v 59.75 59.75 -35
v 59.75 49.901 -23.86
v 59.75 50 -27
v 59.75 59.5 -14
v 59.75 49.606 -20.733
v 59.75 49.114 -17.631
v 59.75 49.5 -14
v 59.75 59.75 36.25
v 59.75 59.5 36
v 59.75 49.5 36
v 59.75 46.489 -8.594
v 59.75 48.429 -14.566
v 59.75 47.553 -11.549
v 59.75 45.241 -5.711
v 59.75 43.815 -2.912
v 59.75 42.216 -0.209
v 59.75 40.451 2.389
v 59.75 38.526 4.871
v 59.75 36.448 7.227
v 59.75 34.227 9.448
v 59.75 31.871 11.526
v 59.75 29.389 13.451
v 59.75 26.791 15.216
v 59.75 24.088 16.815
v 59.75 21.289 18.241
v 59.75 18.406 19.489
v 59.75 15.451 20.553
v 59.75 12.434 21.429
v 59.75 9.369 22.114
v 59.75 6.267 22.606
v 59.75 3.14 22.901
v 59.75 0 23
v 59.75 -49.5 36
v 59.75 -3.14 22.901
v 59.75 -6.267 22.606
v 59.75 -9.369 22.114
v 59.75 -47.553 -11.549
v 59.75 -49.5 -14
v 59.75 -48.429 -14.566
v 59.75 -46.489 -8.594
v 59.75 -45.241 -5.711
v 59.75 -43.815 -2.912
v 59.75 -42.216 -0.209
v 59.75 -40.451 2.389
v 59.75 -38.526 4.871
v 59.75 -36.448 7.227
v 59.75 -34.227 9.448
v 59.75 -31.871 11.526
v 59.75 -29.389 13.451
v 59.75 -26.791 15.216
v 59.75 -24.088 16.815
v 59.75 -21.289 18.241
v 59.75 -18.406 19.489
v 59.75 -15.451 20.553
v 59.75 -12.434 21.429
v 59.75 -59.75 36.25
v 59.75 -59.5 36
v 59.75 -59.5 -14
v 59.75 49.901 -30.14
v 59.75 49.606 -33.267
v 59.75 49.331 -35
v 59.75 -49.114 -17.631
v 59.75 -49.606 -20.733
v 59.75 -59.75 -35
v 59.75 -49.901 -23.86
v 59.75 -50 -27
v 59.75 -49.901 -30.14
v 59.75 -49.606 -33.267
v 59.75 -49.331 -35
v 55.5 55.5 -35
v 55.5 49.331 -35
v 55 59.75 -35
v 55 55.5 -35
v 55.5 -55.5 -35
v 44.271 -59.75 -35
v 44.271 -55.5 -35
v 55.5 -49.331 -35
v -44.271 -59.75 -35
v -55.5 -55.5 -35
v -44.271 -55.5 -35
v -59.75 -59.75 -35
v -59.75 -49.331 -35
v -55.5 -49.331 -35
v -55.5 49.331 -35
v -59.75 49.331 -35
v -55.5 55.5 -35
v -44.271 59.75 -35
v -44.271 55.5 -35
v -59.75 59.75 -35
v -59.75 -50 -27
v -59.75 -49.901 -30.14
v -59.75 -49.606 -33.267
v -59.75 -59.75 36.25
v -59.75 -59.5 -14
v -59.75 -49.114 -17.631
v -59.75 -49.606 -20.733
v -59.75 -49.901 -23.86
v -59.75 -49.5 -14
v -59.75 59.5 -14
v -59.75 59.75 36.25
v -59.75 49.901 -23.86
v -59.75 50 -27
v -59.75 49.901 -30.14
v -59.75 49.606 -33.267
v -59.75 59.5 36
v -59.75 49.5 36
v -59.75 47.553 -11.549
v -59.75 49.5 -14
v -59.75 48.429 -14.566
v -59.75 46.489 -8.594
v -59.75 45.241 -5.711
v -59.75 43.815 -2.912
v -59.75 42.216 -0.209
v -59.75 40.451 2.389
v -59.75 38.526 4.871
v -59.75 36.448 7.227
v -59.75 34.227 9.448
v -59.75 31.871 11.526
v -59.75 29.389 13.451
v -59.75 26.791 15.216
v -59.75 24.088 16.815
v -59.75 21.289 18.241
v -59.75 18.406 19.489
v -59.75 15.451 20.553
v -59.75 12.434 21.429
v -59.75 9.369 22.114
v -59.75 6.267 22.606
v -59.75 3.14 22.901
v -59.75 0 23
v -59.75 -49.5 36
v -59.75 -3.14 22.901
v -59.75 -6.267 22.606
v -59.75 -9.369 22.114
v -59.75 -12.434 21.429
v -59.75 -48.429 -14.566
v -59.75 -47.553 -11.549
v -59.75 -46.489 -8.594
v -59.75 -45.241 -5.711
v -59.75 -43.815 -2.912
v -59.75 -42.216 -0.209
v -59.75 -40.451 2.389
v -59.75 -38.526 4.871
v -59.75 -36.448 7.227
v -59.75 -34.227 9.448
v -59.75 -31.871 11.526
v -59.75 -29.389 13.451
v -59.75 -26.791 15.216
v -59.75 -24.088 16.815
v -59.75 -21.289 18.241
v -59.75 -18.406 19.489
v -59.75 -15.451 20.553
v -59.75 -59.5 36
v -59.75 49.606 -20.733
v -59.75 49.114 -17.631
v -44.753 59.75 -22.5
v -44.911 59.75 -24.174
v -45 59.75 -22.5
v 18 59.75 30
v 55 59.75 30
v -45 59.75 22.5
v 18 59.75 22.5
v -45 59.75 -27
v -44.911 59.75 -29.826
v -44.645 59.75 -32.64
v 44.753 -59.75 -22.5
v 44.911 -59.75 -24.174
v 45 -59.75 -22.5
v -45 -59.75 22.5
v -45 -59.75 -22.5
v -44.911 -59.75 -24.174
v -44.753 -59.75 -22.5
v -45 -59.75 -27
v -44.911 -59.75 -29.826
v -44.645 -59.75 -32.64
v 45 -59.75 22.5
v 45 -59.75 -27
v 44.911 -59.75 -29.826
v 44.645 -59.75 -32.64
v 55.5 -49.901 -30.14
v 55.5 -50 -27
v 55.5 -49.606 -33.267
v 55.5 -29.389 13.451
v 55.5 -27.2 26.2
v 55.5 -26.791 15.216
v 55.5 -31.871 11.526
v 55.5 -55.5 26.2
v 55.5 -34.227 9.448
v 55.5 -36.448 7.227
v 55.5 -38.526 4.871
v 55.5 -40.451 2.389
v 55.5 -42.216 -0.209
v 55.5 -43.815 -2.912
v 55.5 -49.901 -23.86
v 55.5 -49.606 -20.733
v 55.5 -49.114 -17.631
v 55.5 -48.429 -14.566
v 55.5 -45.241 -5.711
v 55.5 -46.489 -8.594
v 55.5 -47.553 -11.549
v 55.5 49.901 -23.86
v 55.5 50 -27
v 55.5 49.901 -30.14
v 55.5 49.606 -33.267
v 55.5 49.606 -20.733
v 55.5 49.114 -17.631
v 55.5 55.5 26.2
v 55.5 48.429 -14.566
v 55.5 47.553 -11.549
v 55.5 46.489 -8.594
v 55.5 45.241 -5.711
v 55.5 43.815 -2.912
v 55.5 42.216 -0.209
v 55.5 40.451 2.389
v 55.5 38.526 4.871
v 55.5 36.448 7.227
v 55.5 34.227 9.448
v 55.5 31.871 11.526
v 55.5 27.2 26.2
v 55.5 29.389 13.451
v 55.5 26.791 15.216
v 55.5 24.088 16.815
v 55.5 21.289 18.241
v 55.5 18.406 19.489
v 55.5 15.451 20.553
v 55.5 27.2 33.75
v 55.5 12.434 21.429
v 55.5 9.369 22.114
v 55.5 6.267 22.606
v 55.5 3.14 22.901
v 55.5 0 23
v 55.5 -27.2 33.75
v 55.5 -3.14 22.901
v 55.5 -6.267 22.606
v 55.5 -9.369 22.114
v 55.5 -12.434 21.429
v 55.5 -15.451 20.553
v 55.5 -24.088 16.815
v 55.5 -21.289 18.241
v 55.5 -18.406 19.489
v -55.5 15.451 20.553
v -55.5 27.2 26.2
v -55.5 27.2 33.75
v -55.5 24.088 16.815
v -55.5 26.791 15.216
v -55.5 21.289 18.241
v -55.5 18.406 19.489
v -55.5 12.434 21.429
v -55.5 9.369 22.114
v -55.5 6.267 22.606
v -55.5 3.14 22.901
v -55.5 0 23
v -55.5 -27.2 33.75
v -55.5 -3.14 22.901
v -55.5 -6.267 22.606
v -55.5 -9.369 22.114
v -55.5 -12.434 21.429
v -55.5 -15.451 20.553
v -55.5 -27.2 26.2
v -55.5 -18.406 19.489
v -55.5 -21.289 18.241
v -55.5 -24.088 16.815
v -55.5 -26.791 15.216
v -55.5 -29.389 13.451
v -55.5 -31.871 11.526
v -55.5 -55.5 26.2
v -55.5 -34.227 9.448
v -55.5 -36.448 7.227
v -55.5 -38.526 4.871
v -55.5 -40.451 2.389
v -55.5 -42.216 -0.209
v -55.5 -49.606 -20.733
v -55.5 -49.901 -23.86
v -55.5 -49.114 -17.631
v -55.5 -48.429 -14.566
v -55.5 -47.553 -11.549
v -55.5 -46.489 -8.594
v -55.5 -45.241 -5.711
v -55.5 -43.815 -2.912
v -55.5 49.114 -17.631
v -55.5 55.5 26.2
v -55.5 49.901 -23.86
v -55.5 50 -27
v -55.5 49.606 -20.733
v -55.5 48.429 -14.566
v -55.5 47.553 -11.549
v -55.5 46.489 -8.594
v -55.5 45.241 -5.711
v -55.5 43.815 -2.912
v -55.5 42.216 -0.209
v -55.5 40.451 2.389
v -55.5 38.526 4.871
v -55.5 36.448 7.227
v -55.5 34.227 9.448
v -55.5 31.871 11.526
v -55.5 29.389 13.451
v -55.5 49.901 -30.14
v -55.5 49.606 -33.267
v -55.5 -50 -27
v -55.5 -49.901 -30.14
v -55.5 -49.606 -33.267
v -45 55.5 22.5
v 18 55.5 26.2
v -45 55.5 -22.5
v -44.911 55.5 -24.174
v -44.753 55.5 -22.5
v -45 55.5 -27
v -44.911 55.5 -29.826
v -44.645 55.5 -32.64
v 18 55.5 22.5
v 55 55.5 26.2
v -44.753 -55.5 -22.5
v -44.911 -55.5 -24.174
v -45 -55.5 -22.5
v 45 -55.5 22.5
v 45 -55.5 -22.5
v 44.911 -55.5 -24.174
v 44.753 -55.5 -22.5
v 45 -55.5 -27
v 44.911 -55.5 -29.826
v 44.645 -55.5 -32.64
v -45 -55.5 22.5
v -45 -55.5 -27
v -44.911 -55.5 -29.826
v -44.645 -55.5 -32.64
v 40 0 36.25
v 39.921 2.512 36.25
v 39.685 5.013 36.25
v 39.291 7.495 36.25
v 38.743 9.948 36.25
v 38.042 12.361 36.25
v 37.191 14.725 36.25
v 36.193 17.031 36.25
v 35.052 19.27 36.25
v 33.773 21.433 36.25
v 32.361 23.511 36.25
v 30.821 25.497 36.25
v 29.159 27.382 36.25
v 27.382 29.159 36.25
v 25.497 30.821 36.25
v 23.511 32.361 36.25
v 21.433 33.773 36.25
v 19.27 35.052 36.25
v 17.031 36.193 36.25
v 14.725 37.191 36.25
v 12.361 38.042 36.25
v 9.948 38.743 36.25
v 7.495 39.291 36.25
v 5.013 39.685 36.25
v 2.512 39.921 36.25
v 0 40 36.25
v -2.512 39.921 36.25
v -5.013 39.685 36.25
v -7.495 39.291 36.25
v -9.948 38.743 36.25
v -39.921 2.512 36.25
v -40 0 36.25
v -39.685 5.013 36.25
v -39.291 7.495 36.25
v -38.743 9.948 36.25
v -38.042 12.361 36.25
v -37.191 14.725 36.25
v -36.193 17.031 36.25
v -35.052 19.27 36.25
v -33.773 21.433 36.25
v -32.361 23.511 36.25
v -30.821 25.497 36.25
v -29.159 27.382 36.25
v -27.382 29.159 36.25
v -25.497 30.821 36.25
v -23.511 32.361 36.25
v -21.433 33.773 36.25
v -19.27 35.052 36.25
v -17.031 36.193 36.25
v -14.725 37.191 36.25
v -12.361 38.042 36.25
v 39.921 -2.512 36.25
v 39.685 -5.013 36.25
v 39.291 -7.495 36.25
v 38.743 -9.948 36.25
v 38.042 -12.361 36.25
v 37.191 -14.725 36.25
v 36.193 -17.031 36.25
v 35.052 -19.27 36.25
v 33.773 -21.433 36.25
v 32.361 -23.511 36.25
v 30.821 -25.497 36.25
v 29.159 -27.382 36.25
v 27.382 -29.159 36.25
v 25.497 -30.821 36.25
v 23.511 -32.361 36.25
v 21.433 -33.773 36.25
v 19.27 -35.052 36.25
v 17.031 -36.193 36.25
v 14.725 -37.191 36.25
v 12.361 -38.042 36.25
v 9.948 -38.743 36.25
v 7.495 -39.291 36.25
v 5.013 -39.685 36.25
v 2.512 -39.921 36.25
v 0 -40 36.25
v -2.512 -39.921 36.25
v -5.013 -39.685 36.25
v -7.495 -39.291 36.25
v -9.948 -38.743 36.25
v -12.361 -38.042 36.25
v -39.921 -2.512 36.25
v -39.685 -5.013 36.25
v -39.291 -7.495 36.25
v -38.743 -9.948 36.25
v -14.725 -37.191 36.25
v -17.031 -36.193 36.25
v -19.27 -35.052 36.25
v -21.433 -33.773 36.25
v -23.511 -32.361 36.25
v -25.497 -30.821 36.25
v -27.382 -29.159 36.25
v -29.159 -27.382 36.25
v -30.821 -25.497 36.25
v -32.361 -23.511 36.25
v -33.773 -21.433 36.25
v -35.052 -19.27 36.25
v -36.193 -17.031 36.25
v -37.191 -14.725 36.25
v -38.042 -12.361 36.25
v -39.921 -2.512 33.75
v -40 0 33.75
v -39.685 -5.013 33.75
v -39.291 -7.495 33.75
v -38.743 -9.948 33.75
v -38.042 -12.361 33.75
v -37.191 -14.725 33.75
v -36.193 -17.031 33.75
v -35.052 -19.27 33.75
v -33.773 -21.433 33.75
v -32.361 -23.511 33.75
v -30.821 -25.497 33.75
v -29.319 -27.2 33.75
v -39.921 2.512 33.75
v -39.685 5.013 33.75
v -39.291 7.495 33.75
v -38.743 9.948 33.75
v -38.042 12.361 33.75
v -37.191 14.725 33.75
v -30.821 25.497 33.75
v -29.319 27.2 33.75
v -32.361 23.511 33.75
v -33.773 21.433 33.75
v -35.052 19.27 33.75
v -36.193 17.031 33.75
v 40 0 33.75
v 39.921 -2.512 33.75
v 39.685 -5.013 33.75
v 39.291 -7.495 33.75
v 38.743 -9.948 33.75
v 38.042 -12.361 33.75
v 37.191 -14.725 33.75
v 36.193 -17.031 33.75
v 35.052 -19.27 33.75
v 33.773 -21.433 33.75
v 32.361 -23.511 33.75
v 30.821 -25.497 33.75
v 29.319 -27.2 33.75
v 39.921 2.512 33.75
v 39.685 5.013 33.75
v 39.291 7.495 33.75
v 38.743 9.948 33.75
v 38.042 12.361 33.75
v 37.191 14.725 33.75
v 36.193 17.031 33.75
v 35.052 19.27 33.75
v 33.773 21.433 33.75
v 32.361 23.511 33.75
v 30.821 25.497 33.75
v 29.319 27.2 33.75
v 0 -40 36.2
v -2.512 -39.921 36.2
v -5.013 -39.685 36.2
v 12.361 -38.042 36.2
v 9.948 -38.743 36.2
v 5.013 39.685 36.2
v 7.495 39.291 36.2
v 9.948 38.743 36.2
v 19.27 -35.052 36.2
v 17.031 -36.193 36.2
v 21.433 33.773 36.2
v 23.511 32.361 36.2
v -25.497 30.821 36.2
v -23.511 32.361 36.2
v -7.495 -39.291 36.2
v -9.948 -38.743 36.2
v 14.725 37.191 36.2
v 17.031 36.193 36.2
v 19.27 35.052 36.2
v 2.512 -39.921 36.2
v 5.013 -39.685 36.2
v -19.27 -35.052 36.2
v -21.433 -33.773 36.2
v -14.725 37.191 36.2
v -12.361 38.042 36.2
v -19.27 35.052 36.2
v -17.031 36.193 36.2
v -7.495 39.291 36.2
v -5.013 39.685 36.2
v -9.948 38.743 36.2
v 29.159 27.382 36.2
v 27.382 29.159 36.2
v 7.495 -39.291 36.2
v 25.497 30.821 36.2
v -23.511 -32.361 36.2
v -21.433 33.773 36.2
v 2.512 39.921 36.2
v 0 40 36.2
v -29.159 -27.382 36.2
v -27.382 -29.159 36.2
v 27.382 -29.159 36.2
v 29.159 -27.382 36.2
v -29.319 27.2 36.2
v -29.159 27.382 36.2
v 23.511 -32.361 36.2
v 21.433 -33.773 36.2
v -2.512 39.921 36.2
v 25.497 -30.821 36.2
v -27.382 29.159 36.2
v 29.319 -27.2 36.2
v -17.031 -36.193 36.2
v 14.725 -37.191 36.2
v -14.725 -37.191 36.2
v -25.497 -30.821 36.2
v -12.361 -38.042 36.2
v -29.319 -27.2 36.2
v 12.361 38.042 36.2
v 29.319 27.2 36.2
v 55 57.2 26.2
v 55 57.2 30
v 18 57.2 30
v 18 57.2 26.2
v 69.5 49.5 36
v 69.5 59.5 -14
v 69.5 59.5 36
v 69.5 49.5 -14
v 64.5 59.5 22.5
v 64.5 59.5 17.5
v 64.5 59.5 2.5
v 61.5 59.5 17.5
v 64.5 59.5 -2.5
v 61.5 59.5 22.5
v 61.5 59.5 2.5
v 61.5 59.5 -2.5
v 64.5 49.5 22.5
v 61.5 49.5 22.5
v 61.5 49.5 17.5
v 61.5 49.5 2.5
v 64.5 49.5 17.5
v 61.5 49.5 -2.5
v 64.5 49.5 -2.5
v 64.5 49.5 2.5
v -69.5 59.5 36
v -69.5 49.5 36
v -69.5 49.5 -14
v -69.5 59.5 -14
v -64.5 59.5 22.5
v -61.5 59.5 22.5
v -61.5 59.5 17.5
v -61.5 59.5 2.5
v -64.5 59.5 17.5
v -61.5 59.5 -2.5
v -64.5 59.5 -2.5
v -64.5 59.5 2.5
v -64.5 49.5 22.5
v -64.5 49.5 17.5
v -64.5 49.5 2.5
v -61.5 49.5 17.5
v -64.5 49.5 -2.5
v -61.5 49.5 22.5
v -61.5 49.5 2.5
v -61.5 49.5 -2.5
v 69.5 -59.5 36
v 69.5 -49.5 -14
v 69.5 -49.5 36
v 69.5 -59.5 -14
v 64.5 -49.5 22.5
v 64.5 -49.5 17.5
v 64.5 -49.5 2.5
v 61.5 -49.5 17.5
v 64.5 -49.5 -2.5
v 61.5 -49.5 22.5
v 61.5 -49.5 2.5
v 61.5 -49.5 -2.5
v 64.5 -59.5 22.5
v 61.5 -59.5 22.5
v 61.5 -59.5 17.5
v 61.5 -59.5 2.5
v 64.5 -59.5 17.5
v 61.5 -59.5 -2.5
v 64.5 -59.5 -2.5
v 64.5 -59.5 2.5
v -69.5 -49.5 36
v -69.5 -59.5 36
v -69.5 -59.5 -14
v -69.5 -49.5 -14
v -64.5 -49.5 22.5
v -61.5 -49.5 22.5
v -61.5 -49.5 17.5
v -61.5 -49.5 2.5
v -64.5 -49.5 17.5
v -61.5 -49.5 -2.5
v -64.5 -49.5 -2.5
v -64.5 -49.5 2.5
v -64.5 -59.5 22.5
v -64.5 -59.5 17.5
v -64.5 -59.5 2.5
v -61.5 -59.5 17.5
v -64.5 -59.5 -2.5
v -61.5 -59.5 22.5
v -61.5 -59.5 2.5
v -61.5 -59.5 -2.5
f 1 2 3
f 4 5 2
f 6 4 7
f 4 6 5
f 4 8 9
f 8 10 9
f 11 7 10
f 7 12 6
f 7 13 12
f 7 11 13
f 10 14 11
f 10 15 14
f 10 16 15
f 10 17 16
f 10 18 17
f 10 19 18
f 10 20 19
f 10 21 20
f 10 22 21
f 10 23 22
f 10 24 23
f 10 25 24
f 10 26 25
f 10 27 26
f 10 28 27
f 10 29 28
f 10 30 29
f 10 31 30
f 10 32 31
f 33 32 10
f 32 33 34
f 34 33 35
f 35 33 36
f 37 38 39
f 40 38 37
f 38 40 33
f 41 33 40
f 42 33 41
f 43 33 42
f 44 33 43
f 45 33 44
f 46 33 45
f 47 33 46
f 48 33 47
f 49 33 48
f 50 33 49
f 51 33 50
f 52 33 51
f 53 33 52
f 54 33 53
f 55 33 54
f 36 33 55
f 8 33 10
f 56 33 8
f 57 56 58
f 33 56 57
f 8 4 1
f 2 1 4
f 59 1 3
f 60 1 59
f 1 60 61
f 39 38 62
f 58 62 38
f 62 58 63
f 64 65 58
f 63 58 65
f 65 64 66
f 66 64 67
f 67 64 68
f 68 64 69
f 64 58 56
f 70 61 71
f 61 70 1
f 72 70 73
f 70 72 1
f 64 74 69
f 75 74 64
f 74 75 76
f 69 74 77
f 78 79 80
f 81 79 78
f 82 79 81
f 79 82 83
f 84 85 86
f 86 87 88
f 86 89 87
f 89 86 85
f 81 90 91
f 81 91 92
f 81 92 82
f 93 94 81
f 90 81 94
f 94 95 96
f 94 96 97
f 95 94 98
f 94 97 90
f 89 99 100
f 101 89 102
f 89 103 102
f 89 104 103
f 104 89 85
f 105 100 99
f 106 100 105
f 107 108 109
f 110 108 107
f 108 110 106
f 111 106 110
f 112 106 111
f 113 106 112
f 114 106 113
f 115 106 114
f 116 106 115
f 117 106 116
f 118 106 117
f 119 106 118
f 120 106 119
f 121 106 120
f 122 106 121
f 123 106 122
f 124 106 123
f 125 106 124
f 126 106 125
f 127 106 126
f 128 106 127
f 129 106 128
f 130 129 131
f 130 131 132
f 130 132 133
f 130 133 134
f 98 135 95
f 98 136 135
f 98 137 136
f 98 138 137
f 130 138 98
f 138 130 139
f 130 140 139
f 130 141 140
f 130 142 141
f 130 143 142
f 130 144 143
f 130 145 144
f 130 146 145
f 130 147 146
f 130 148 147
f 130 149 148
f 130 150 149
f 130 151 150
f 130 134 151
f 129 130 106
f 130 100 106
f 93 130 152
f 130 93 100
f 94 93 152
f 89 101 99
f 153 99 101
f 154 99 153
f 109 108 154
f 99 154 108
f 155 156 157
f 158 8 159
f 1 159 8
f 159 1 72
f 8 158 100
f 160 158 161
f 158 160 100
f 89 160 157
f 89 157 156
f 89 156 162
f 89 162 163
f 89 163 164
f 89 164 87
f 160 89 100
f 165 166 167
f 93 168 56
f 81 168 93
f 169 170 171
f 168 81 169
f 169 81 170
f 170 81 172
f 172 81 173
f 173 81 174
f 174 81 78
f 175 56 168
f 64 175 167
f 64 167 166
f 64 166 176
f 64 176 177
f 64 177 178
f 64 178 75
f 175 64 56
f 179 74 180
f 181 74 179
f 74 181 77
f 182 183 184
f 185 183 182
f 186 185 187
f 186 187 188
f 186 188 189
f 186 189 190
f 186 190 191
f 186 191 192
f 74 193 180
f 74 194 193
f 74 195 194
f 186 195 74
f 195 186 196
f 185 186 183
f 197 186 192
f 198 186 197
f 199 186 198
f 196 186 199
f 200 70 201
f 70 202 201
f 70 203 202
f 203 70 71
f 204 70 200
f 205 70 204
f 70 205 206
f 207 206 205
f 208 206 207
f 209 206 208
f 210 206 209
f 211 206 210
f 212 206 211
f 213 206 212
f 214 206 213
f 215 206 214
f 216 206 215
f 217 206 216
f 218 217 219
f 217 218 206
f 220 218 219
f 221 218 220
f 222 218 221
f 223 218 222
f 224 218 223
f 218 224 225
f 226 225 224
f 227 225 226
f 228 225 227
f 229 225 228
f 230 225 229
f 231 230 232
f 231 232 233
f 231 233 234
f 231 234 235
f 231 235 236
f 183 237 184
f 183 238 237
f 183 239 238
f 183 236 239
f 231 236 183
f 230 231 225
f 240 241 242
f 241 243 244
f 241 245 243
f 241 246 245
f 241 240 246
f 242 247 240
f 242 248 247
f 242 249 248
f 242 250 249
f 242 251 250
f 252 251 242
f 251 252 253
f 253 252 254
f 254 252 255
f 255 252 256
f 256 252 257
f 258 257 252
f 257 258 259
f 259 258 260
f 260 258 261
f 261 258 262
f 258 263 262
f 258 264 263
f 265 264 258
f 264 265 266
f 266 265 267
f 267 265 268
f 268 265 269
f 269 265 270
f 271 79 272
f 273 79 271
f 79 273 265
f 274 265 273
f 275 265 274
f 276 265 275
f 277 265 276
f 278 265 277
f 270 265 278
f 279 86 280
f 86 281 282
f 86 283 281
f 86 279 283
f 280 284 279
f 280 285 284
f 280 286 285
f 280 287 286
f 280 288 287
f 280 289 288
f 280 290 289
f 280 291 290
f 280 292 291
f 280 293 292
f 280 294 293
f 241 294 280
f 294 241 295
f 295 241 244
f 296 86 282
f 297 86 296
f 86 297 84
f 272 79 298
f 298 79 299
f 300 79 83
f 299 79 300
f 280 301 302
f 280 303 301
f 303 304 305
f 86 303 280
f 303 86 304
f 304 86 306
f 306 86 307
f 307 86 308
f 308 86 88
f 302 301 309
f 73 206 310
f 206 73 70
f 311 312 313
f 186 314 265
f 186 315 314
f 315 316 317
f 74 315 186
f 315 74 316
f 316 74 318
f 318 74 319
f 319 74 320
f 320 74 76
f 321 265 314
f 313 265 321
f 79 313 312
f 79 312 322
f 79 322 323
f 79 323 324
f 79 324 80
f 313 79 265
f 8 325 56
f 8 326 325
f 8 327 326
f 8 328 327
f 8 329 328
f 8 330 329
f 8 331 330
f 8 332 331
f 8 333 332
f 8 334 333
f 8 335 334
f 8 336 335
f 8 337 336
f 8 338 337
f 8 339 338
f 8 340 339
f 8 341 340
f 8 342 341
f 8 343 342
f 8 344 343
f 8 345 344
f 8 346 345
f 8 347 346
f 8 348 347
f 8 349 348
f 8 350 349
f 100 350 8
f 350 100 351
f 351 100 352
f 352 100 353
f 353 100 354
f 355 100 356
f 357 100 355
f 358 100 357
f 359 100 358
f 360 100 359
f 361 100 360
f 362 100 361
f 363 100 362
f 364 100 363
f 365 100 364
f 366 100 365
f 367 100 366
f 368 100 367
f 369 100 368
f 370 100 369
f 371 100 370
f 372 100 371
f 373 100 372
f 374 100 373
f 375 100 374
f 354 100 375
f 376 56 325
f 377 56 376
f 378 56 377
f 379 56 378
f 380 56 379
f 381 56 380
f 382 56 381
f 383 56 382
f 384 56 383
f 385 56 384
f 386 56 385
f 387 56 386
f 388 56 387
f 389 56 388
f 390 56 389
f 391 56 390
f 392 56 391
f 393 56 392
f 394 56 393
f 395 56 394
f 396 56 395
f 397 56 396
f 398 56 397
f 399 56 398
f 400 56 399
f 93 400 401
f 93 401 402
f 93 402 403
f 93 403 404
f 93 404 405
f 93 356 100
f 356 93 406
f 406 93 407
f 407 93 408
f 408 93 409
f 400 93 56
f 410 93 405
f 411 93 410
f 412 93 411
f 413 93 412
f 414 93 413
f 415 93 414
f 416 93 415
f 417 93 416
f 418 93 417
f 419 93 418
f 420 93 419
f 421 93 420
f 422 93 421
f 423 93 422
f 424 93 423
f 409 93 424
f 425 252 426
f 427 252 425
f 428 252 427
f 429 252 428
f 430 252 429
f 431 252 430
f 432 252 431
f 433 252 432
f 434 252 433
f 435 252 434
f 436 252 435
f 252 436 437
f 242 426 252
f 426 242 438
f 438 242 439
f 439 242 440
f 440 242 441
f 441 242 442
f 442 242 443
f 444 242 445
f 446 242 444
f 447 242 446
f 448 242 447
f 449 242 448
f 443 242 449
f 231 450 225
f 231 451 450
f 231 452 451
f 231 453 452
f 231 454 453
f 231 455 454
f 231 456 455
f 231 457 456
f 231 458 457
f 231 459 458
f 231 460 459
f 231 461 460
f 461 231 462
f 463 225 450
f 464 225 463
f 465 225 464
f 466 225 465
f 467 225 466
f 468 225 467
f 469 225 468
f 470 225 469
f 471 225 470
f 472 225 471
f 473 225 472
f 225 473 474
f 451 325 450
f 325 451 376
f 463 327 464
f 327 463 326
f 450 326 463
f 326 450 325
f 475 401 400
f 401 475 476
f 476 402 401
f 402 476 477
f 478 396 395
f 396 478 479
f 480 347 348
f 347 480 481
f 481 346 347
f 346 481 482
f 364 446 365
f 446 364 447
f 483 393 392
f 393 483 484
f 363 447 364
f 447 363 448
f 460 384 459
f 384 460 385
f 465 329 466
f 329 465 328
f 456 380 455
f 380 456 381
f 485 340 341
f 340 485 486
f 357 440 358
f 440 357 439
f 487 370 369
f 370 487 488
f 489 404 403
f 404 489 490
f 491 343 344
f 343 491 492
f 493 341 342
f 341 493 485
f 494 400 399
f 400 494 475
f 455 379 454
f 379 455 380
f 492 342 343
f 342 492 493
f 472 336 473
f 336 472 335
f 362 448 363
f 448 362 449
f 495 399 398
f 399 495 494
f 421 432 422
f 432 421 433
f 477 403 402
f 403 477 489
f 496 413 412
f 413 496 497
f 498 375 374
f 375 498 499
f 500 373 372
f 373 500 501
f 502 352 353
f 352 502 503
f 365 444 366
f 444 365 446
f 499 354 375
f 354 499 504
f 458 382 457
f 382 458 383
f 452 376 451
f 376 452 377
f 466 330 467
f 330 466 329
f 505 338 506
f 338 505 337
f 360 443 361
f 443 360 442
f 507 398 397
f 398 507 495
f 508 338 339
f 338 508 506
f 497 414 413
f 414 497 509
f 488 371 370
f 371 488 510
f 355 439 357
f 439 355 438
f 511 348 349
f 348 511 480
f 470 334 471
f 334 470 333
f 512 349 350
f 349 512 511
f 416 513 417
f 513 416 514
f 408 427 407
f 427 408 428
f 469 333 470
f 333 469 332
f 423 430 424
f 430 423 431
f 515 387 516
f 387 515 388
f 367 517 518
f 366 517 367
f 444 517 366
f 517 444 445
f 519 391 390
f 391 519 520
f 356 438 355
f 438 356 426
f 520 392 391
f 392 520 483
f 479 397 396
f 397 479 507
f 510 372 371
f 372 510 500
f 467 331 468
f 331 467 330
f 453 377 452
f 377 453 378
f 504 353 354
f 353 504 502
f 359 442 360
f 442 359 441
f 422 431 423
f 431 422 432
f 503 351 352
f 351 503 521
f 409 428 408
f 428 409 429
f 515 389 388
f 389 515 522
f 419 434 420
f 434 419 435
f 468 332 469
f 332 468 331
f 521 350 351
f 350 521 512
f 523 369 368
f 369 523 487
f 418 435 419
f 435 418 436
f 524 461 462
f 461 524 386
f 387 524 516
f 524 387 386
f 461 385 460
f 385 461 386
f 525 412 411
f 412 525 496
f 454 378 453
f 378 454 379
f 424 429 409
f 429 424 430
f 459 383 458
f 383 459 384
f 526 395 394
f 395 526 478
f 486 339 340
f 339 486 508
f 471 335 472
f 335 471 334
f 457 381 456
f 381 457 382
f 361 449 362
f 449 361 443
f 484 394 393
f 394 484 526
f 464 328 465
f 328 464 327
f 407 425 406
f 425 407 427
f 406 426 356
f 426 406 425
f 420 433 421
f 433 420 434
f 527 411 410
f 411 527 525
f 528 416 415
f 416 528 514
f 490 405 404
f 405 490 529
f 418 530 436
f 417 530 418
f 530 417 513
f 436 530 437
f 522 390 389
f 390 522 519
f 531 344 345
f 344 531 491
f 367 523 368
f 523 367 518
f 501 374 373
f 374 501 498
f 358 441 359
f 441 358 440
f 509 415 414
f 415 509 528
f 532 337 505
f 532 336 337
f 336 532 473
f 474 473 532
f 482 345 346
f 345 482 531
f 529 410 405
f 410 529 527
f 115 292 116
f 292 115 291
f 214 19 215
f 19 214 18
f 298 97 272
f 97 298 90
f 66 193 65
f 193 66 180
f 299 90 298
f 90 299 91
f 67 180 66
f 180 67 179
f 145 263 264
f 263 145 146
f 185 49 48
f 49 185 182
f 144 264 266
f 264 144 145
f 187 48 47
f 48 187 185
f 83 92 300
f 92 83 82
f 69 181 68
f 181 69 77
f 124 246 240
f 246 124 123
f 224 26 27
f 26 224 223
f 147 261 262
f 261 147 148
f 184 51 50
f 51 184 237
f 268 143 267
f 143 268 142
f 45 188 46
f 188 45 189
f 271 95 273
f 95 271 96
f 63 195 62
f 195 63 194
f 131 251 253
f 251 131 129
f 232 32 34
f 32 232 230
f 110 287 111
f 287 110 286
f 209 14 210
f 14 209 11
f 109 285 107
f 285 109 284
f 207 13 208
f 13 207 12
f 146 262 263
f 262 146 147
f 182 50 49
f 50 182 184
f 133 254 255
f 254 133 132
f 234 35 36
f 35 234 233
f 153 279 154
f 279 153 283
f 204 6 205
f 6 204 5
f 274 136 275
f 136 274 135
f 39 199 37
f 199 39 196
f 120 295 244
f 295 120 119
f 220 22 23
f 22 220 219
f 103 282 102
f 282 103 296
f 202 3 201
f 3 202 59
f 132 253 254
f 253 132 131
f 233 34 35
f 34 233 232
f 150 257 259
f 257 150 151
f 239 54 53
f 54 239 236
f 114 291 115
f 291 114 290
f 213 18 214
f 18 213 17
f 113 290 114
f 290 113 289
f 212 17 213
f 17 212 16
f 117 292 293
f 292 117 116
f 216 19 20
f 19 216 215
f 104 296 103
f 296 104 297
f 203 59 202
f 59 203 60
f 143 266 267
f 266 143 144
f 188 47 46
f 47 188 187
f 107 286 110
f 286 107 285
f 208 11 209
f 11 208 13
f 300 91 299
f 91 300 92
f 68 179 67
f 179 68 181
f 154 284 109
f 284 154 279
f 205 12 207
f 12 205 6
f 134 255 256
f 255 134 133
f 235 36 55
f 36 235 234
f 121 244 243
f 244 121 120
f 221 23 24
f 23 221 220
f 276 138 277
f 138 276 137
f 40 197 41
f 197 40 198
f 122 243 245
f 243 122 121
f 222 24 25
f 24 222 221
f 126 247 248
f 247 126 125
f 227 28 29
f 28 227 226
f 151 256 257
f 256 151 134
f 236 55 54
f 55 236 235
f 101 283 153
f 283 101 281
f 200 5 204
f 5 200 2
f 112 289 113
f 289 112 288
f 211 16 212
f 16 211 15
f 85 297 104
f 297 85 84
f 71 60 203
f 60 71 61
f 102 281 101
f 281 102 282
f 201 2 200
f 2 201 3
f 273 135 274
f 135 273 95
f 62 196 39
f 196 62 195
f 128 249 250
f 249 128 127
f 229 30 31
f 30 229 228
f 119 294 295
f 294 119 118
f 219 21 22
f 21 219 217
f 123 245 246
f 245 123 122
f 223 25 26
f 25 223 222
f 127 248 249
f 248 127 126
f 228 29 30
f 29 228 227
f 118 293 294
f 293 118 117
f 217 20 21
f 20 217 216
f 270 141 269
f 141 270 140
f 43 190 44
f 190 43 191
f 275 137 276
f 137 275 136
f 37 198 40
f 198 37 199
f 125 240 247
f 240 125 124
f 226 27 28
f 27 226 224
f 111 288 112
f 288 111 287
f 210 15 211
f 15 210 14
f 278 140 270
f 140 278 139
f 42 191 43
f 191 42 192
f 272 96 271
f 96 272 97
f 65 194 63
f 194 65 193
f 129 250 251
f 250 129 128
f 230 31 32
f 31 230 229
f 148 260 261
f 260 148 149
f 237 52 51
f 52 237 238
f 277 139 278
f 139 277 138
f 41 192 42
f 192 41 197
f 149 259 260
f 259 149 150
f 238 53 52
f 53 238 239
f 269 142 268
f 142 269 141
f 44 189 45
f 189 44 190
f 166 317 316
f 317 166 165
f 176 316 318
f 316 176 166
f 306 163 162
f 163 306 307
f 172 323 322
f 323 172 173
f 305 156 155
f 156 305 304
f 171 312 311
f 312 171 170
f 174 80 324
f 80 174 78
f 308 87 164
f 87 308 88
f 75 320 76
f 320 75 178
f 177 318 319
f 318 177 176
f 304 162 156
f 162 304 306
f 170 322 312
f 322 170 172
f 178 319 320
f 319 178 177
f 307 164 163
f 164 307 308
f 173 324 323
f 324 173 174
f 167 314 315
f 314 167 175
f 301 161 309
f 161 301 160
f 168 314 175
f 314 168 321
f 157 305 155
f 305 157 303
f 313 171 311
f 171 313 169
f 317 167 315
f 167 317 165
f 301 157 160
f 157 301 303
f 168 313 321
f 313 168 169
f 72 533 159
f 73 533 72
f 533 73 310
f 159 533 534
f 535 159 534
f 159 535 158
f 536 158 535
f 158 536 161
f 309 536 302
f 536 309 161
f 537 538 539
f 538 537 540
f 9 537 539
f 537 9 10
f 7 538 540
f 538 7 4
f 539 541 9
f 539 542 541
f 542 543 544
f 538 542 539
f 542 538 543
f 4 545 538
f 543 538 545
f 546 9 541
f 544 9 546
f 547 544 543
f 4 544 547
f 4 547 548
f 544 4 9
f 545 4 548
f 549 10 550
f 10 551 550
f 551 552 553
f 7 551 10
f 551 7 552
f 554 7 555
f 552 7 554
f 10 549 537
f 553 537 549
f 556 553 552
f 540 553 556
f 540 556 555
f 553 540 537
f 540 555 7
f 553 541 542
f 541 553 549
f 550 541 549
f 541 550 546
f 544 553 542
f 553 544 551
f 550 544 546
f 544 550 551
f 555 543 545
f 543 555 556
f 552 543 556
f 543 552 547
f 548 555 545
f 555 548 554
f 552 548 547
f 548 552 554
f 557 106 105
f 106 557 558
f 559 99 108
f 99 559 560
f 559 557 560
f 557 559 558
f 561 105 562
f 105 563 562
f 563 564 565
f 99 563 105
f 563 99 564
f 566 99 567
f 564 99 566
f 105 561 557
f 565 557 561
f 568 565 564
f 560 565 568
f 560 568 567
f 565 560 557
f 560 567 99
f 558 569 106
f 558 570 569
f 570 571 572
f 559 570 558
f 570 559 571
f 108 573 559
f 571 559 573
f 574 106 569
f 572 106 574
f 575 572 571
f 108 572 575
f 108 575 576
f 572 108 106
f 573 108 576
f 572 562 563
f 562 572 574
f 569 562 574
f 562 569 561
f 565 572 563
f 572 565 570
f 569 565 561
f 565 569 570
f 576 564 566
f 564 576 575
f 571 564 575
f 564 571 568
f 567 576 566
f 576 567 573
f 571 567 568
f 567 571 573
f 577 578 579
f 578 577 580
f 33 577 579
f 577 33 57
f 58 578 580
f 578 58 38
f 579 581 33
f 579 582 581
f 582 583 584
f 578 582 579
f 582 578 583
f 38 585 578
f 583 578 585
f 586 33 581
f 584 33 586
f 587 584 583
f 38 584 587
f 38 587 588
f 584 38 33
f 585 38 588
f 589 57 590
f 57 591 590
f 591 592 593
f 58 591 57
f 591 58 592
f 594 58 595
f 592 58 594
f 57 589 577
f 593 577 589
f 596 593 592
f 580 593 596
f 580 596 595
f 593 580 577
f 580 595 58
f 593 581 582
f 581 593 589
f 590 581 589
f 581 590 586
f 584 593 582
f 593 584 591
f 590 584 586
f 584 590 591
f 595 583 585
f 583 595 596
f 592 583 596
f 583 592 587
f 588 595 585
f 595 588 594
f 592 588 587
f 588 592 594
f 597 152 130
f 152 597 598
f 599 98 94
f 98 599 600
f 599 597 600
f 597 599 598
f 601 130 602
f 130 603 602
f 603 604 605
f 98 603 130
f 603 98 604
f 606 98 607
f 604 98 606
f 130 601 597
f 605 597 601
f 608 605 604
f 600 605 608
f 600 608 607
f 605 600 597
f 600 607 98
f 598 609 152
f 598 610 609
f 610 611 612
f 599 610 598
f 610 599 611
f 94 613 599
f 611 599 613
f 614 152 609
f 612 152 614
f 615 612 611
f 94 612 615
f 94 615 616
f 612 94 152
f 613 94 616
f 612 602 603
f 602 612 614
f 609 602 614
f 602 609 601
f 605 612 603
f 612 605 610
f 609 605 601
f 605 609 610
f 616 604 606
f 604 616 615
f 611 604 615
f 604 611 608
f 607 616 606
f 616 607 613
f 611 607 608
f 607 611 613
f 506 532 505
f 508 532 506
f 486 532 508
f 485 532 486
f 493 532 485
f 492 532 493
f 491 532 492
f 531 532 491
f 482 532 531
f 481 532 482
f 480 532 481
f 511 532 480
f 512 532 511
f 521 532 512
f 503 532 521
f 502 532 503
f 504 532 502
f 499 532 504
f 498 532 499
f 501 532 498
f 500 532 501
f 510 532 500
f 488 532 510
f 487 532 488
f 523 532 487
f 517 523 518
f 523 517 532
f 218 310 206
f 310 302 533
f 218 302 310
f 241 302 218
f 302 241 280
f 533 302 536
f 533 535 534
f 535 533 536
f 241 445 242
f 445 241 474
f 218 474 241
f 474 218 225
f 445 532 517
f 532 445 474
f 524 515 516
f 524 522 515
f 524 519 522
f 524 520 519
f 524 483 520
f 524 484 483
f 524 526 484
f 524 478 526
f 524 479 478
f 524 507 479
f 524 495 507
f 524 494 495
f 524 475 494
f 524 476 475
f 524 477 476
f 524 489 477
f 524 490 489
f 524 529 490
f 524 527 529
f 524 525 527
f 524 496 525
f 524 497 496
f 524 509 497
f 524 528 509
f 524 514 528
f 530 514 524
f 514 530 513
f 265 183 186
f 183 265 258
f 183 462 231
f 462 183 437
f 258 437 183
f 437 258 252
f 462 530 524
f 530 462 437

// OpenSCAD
// WASABI Niko FDM Printer
// Board case
// GNU GPL v3
// SANTA no Mix
// https://ameblo.jp/math-physics/theme-10117154956.html
// https://github.com/SantaNoMix/

$fn = 100;
difference () {
    difference () {
        difference () {
            union () {
                difference () {
                    union () {
                        difference () {
                            cube ([119.5,119.5,70],center = true);
                            cube ([111,111,71],center = true);
                        }
                        translate ([0,0,35]) {
                            cube ([119.5,119.5,2.5],center = true);
                        }
                    }
                    translate ([0,0,15]) {
                        cylinder (80,40,40,center = true);
                    }
                }
            }
            translate ([0,0,-27]) {
                rotate ([0,90,0]) {
                    cylinder (150,50,50,center = true);
                }
            }
        }
        translate ([0,0,-27]) {
            rotate ([90,0,0]) {
                cylinder (150,45,45,center = true);
            }
        }
    }
    translate ([0,0,0]) {
        cube ([90,190,45],center = true);
    }
    translate ([18,50,-40]) {
        cube ([37,10,70]);
    }
}
translate ([0,42.2,31.2]) {
    cube ([119,30,10],center = true);
}
translate ([0,-42.2,31.2]) {
    cube ([119,30,10],center = true);
}
difference () {
    translate ([63,54.5,11]) {
        cube ([13,10,50],center = true);
    }
    translate ([63,54.5,20]) {
        cube ([3,15,5],center = true);
    }
    translate ([63,54.5,0]) {
        cube ([3,15,5],center = true);
    }
}
difference () {
    translate ([-63,54.5,11]) {
        cube ([13,10,50],center = true);
    }
    translate ([-63,54.5,20]) {
        cube ([3,15,5],center = true);
    }
    translate ([-63,54.5,0]) {
        cube ([3,15,5],center = true);
    }
}
difference () {
    translate ([63,-54.5,11]) {
        cube ([13,10,50],center = true);
    }
    translate ([63,-54.5,20]) {
        cube ([3,15,5],center = true);
    }
    translate ([63,-54.5,0]) {
        cube ([3,15,5],center = true);
    }
}
difference () {
    translate ([-63,-54.5,11]) {
        cube ([13,10,50],center = true);
    }
    translate ([-63,-54.5,20]) {
        cube ([3,15,5],center = true);
    }
    translate ([-63,-54.5,0]) {
        cube ([3,15,5],center = true);
    }
}
